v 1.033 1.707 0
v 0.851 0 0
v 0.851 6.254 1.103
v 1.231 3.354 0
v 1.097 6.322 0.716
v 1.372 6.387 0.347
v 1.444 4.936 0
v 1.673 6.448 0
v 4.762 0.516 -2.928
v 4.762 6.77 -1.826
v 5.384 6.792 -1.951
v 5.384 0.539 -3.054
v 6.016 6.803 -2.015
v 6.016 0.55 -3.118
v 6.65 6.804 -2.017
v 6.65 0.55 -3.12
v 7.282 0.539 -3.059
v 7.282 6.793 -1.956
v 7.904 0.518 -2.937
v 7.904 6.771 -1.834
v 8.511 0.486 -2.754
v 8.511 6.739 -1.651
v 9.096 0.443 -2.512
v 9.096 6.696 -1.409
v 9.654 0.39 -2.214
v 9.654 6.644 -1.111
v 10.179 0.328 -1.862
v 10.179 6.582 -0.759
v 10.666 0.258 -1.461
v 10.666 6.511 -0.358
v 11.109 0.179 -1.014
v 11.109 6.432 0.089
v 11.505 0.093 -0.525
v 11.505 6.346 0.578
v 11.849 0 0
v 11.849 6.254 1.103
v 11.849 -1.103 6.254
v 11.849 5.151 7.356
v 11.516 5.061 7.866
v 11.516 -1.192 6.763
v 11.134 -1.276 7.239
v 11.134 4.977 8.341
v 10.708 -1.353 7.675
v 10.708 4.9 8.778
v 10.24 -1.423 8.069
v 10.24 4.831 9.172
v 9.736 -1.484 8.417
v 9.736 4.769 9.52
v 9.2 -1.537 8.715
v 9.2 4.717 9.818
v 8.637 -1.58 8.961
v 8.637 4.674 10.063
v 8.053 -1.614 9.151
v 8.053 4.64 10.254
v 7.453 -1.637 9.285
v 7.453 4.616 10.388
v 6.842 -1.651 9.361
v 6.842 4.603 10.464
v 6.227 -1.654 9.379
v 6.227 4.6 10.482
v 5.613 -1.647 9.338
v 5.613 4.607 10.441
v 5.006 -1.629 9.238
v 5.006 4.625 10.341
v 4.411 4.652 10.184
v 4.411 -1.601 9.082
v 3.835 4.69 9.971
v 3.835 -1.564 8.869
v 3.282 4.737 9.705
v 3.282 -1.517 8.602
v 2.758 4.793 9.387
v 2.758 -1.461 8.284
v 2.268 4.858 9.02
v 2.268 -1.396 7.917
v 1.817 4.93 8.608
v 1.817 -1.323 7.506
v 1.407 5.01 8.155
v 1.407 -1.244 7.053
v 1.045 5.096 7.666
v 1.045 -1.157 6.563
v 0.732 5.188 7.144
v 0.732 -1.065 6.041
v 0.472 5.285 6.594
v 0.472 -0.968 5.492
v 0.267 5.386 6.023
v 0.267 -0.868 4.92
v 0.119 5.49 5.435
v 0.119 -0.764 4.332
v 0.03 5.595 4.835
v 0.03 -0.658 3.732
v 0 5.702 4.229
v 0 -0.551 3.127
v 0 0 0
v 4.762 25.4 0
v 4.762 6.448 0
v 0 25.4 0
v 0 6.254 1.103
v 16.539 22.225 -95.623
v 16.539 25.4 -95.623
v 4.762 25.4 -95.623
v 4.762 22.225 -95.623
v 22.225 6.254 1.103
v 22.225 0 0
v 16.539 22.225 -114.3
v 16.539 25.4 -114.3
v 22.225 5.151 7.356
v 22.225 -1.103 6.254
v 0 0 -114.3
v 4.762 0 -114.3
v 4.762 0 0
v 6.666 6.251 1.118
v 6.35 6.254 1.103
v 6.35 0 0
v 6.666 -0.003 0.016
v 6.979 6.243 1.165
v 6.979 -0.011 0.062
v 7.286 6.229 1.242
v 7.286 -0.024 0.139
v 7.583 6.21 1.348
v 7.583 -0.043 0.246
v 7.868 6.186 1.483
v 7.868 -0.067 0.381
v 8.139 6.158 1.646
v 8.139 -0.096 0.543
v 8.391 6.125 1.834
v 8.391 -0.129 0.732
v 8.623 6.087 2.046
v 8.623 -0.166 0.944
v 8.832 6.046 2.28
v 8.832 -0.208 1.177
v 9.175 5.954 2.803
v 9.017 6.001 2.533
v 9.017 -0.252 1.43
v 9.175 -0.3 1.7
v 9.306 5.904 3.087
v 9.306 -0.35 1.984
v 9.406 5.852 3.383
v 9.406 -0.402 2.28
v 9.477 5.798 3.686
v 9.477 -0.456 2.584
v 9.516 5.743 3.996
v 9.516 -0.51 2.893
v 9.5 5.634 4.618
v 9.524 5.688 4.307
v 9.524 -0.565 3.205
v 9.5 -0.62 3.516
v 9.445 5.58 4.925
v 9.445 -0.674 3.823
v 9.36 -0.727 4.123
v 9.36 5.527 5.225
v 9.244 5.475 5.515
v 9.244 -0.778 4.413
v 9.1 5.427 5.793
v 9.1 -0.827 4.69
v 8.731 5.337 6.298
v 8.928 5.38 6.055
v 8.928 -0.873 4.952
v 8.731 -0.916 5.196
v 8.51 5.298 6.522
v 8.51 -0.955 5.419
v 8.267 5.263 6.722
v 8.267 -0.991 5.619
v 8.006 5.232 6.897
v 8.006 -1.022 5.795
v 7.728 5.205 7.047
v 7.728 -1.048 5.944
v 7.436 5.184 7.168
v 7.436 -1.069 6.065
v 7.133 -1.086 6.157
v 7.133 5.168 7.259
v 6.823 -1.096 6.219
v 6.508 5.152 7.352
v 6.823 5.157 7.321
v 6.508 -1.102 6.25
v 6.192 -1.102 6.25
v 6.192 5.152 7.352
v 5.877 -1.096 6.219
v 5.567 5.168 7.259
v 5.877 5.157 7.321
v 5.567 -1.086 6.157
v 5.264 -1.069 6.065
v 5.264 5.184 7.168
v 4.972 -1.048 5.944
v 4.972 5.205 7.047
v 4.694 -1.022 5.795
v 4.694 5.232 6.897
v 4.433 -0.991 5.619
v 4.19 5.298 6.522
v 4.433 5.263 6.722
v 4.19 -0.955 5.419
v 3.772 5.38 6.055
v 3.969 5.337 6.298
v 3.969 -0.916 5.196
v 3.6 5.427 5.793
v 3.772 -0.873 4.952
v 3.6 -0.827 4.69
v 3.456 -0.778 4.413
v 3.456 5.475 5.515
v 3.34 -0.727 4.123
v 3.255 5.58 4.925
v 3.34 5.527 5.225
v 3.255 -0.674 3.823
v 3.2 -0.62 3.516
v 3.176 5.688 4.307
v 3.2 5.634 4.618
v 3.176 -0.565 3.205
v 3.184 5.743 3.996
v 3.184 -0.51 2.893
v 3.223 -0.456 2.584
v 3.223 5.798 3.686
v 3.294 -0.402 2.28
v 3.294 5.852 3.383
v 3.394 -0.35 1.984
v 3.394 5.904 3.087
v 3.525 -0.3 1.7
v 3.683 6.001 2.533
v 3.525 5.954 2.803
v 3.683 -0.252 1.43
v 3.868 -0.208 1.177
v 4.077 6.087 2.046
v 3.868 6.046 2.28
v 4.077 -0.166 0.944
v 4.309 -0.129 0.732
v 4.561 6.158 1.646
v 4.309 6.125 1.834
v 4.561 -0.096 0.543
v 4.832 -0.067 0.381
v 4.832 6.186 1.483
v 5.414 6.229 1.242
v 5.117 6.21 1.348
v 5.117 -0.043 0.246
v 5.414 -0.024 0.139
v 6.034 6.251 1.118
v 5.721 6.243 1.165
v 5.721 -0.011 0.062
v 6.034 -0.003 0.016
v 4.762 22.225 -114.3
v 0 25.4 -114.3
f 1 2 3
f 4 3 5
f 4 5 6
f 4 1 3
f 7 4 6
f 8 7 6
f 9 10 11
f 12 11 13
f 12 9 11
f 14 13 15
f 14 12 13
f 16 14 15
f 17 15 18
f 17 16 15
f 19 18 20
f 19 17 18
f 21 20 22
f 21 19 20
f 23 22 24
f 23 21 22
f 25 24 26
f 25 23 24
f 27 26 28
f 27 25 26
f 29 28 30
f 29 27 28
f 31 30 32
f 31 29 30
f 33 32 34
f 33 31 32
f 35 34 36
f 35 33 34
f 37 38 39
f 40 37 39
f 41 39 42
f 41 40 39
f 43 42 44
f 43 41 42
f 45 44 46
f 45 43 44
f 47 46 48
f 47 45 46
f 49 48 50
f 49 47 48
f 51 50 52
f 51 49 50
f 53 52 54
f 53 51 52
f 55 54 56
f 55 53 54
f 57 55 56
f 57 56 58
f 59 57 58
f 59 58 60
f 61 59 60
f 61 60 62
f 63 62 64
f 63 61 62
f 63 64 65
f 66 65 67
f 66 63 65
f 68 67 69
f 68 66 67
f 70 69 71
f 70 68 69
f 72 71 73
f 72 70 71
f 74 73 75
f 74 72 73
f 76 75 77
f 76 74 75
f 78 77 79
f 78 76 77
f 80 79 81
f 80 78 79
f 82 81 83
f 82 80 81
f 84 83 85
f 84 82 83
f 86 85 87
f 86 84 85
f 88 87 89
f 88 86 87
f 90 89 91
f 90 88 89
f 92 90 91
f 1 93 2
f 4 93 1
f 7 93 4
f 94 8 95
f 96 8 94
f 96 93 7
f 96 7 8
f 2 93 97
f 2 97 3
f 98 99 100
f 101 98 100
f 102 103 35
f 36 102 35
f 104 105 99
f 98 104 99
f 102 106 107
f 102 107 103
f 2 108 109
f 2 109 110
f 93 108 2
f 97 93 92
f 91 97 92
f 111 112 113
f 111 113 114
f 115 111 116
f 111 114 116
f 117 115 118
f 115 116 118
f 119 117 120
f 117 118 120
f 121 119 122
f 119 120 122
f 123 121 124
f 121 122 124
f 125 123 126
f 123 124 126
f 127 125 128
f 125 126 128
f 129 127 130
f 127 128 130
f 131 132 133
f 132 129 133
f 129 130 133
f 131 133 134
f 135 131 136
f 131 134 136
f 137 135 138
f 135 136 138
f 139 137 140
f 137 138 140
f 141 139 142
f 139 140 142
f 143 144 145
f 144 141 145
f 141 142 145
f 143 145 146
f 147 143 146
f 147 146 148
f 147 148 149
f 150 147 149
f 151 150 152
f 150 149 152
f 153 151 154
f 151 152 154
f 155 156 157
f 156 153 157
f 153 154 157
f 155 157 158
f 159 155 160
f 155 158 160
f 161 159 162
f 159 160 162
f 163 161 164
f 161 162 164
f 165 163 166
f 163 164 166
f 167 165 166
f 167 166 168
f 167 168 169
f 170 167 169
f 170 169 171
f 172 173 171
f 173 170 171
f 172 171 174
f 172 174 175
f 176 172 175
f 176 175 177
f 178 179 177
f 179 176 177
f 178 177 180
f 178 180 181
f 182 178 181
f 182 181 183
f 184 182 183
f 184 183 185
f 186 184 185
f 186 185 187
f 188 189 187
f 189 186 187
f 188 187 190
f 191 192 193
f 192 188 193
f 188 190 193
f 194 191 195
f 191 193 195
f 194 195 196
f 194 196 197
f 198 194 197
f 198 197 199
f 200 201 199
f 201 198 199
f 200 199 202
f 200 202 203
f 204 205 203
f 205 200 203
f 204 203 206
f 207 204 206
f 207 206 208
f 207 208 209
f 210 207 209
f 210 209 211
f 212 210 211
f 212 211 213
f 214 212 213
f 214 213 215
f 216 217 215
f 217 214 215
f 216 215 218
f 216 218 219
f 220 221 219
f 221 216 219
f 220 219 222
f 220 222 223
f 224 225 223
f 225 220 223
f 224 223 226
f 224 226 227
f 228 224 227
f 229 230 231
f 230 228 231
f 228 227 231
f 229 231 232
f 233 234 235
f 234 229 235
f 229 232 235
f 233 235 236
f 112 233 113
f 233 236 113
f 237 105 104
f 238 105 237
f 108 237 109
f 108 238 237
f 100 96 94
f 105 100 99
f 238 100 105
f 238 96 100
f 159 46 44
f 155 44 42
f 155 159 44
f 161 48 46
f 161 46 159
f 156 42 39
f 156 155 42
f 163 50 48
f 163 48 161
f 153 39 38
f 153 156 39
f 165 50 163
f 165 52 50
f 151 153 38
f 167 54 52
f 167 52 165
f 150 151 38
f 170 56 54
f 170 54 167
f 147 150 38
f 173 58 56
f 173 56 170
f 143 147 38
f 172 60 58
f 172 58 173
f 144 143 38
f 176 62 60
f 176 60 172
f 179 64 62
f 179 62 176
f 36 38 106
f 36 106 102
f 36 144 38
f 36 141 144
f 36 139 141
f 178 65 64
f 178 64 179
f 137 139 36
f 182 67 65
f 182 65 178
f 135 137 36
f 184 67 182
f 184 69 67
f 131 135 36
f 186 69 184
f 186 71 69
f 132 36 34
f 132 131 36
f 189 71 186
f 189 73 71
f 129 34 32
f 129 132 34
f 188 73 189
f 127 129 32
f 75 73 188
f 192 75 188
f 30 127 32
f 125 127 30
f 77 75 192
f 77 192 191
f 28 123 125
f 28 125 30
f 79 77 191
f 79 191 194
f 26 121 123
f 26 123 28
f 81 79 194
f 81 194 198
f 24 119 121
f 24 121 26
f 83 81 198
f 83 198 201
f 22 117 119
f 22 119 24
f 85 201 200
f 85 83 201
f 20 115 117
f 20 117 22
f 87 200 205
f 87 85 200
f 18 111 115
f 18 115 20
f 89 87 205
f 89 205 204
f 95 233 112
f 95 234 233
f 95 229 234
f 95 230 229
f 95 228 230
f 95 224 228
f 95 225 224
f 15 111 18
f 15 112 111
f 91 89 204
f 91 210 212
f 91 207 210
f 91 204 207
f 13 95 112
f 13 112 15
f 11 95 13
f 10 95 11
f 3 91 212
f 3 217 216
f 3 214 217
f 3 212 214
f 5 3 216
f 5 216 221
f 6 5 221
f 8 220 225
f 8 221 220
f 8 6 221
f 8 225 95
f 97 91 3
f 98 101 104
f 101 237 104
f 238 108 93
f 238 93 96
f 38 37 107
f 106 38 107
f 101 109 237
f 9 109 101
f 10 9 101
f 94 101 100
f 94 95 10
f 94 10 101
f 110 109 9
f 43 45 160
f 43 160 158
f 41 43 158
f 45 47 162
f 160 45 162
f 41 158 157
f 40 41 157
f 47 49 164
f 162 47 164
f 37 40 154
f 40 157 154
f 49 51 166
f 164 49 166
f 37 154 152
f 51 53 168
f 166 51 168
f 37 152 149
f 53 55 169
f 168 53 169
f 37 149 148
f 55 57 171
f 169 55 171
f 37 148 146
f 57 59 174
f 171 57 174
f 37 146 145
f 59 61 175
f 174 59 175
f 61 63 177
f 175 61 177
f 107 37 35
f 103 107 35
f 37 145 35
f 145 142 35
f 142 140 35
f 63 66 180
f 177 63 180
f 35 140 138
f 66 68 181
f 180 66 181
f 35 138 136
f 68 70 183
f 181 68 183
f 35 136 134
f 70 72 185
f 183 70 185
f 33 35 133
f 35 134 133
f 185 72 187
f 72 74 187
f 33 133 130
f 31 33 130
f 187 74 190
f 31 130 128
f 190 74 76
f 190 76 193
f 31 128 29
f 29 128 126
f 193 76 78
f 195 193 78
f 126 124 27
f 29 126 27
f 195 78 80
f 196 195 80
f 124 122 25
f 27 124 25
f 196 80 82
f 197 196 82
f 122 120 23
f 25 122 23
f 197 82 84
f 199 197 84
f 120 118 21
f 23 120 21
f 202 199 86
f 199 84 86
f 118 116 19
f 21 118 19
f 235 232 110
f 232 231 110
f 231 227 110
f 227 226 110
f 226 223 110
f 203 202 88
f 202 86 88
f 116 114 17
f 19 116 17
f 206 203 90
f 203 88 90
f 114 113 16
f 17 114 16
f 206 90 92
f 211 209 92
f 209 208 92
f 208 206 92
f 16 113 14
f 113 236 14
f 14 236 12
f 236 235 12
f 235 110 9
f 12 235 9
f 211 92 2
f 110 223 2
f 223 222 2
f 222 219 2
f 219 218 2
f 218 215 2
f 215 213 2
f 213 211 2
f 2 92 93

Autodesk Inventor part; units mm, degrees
ref_plane "YZ Plane" through (0, 0, 0) normal (1, 0, 0) x (0, 1, 0)
ref_plane "XZ Plane" through (0, 0, 0) normal (0, 1, 0) x (-1, 0, 0)
ref_plane "XY Plane" through (0, 0, 0) normal (0, 0, 1) x (1, 0, 0)
sketch "Sketch2" plane through (0, 0, 0) normal (1, 0, 0) x (0, 1, 0)
  line L0 (0, 0) -> (25.4, 0)
  line L1 (25.4, 0) -> (25.4, -114.3)
  line L2 (25.4, -114.3) -> (0, -114.3)
  line L3 (0, -114.3) -> (0, 0)
  dimension "d6" = 25.4
  dimension "d7" = 114.3
extrude "Extrusion2" add sketch "Sketch2" along normal blind 4.7625
sketch "Sketch3" plane through (4.7625, 0, 0) normal (1, 0, 0) x (0, 0, -1)
  line L0 (0, 0) -> (114.3, 0) projected
  line L1 (0, 0) -> (-14.429, -2.5442)
  line L2 (0, 0) -> (14.6516, 0) construction
  dimension "d10" = 170
ref_plane "Work Plane1" through (4.7625, -2.5442, 14.429) normal (0, 0.9848, 0.1736) x (0, 0.1736, -0.9848)
sketch "Sketch4" plane through (4.7625, -2.5442, 14.429) normal (0, 0.9848, 0.1736) x (0, 0.1736, -0.9848)
  line L0 (127.2151, 4.7625) -> (14.6516, 4.7625) projected
  line L1 (127.2151, 4.7625) -> (127.2151, 0) projected
  line L2 (14.6516, 0) -> (127.2151, 0) projected
  line L3 (14.6516, 4.7625) -> (14.6516, 0) projected
  arc A0 (11.4766, 4.7625) -> (14.6516, 3.9118) centre (11.4766, -1.5875) ccw
  circle A1 centre (11.4766, -1.5875) radius 3.175
  line L4 (14.6516, 4.7625) -> (11.4766, 4.7625)
  line L5 (14.6516, 4.7625) -> (14.6516, 0)
  dimension "d11" = 12.7
  dimension "d12" = 3.175
  dimension "d13" = 4.7625
  dimension "d15" = 6.35
  dimension "d26" = 1.5875
extrude "Extrusion3" add sketch "Sketch4" along normal blind 6.35 contours L3 L2 A0 L4 | A0 L2 L3
sketch "Sketch5" plane through (0, 25.4, 0) normal (0, 1, 0) x (1, 0, 0)
  line L0 (0, 0) -> (0, 114.3) projected
  line L1 (0, 0) -> (4.7625, 0) projected
  line L2 (4.7625, 114.3) -> (4.7625, 0) projected
  line L3 (0, 114.3) -> (4.7625, 114.3) projected
  line L4 (0, 114.3) -> (0, 0) projected
  line L5 (0, 114.3) -> (16.5392, 114.3)
  line L6 (16.5392, 114.3) -> (16.5392, 95.6232)
  line L7 (16.5392, 95.6232) -> (0, 95.6232)
  line L8 (0, 95.6232) -> (0, 114.3)
extrude "Extrusion4" add sketch "Sketch5" against normal blind 3.175 contours L0 L3 L2 L7 | L2 L5 L6 L7
sketch "Sketch6" plane through (4.7625, -2.5442, 14.429) normal (0, 0.9848, 0.1736) x (0, 0.1736, -0.9848)
  line L0 (17.6249, 0) -> (14.6516, 0) projected
  arc A0 (17.6249, 0) -> (11.4766, 4.7625) centre (11.4766, -1.5875) ccw projected
  line L1 (14.6516, 3.9118) -> (14.6516, 0) projected
  circle A1 centre (11.4766, -1.5875) radius 3.175 projected
  line L2 (127.2151, 4.7625) -> (14.6516, 4.7625) projected
  line L3 (14.6516, -4.7625) -> (8.3016, -4.7625)
  line L4 (8.3016, -4.7625) -> (8.3016, -17.4625)
  line L5 (8.3016, -17.4625) -> (14.6516, -17.4625)
  line L6 (14.6516, -17.4625) -> (14.6516, -4.7625)
  line L7 (14.6516, 4.7625) -> (11.4766, 4.7625) projected
  line L8 (14.6516, 4.7625) -> (14.6516, 3.9118) projected
  point P0 (17.3632, 4.7625)
  dimension "d22" = 6.35
  dimension "d23" = 12.7
  dimension "d27" = 0
extrude "Extrusion5" add sketch "Sketch6" along normal blind 6.35 contours L3 L6 L5 L4
equation "\"d26\" = 0.5 * d11 - d13"
properties part number "WheelIntakeMotorMount"
